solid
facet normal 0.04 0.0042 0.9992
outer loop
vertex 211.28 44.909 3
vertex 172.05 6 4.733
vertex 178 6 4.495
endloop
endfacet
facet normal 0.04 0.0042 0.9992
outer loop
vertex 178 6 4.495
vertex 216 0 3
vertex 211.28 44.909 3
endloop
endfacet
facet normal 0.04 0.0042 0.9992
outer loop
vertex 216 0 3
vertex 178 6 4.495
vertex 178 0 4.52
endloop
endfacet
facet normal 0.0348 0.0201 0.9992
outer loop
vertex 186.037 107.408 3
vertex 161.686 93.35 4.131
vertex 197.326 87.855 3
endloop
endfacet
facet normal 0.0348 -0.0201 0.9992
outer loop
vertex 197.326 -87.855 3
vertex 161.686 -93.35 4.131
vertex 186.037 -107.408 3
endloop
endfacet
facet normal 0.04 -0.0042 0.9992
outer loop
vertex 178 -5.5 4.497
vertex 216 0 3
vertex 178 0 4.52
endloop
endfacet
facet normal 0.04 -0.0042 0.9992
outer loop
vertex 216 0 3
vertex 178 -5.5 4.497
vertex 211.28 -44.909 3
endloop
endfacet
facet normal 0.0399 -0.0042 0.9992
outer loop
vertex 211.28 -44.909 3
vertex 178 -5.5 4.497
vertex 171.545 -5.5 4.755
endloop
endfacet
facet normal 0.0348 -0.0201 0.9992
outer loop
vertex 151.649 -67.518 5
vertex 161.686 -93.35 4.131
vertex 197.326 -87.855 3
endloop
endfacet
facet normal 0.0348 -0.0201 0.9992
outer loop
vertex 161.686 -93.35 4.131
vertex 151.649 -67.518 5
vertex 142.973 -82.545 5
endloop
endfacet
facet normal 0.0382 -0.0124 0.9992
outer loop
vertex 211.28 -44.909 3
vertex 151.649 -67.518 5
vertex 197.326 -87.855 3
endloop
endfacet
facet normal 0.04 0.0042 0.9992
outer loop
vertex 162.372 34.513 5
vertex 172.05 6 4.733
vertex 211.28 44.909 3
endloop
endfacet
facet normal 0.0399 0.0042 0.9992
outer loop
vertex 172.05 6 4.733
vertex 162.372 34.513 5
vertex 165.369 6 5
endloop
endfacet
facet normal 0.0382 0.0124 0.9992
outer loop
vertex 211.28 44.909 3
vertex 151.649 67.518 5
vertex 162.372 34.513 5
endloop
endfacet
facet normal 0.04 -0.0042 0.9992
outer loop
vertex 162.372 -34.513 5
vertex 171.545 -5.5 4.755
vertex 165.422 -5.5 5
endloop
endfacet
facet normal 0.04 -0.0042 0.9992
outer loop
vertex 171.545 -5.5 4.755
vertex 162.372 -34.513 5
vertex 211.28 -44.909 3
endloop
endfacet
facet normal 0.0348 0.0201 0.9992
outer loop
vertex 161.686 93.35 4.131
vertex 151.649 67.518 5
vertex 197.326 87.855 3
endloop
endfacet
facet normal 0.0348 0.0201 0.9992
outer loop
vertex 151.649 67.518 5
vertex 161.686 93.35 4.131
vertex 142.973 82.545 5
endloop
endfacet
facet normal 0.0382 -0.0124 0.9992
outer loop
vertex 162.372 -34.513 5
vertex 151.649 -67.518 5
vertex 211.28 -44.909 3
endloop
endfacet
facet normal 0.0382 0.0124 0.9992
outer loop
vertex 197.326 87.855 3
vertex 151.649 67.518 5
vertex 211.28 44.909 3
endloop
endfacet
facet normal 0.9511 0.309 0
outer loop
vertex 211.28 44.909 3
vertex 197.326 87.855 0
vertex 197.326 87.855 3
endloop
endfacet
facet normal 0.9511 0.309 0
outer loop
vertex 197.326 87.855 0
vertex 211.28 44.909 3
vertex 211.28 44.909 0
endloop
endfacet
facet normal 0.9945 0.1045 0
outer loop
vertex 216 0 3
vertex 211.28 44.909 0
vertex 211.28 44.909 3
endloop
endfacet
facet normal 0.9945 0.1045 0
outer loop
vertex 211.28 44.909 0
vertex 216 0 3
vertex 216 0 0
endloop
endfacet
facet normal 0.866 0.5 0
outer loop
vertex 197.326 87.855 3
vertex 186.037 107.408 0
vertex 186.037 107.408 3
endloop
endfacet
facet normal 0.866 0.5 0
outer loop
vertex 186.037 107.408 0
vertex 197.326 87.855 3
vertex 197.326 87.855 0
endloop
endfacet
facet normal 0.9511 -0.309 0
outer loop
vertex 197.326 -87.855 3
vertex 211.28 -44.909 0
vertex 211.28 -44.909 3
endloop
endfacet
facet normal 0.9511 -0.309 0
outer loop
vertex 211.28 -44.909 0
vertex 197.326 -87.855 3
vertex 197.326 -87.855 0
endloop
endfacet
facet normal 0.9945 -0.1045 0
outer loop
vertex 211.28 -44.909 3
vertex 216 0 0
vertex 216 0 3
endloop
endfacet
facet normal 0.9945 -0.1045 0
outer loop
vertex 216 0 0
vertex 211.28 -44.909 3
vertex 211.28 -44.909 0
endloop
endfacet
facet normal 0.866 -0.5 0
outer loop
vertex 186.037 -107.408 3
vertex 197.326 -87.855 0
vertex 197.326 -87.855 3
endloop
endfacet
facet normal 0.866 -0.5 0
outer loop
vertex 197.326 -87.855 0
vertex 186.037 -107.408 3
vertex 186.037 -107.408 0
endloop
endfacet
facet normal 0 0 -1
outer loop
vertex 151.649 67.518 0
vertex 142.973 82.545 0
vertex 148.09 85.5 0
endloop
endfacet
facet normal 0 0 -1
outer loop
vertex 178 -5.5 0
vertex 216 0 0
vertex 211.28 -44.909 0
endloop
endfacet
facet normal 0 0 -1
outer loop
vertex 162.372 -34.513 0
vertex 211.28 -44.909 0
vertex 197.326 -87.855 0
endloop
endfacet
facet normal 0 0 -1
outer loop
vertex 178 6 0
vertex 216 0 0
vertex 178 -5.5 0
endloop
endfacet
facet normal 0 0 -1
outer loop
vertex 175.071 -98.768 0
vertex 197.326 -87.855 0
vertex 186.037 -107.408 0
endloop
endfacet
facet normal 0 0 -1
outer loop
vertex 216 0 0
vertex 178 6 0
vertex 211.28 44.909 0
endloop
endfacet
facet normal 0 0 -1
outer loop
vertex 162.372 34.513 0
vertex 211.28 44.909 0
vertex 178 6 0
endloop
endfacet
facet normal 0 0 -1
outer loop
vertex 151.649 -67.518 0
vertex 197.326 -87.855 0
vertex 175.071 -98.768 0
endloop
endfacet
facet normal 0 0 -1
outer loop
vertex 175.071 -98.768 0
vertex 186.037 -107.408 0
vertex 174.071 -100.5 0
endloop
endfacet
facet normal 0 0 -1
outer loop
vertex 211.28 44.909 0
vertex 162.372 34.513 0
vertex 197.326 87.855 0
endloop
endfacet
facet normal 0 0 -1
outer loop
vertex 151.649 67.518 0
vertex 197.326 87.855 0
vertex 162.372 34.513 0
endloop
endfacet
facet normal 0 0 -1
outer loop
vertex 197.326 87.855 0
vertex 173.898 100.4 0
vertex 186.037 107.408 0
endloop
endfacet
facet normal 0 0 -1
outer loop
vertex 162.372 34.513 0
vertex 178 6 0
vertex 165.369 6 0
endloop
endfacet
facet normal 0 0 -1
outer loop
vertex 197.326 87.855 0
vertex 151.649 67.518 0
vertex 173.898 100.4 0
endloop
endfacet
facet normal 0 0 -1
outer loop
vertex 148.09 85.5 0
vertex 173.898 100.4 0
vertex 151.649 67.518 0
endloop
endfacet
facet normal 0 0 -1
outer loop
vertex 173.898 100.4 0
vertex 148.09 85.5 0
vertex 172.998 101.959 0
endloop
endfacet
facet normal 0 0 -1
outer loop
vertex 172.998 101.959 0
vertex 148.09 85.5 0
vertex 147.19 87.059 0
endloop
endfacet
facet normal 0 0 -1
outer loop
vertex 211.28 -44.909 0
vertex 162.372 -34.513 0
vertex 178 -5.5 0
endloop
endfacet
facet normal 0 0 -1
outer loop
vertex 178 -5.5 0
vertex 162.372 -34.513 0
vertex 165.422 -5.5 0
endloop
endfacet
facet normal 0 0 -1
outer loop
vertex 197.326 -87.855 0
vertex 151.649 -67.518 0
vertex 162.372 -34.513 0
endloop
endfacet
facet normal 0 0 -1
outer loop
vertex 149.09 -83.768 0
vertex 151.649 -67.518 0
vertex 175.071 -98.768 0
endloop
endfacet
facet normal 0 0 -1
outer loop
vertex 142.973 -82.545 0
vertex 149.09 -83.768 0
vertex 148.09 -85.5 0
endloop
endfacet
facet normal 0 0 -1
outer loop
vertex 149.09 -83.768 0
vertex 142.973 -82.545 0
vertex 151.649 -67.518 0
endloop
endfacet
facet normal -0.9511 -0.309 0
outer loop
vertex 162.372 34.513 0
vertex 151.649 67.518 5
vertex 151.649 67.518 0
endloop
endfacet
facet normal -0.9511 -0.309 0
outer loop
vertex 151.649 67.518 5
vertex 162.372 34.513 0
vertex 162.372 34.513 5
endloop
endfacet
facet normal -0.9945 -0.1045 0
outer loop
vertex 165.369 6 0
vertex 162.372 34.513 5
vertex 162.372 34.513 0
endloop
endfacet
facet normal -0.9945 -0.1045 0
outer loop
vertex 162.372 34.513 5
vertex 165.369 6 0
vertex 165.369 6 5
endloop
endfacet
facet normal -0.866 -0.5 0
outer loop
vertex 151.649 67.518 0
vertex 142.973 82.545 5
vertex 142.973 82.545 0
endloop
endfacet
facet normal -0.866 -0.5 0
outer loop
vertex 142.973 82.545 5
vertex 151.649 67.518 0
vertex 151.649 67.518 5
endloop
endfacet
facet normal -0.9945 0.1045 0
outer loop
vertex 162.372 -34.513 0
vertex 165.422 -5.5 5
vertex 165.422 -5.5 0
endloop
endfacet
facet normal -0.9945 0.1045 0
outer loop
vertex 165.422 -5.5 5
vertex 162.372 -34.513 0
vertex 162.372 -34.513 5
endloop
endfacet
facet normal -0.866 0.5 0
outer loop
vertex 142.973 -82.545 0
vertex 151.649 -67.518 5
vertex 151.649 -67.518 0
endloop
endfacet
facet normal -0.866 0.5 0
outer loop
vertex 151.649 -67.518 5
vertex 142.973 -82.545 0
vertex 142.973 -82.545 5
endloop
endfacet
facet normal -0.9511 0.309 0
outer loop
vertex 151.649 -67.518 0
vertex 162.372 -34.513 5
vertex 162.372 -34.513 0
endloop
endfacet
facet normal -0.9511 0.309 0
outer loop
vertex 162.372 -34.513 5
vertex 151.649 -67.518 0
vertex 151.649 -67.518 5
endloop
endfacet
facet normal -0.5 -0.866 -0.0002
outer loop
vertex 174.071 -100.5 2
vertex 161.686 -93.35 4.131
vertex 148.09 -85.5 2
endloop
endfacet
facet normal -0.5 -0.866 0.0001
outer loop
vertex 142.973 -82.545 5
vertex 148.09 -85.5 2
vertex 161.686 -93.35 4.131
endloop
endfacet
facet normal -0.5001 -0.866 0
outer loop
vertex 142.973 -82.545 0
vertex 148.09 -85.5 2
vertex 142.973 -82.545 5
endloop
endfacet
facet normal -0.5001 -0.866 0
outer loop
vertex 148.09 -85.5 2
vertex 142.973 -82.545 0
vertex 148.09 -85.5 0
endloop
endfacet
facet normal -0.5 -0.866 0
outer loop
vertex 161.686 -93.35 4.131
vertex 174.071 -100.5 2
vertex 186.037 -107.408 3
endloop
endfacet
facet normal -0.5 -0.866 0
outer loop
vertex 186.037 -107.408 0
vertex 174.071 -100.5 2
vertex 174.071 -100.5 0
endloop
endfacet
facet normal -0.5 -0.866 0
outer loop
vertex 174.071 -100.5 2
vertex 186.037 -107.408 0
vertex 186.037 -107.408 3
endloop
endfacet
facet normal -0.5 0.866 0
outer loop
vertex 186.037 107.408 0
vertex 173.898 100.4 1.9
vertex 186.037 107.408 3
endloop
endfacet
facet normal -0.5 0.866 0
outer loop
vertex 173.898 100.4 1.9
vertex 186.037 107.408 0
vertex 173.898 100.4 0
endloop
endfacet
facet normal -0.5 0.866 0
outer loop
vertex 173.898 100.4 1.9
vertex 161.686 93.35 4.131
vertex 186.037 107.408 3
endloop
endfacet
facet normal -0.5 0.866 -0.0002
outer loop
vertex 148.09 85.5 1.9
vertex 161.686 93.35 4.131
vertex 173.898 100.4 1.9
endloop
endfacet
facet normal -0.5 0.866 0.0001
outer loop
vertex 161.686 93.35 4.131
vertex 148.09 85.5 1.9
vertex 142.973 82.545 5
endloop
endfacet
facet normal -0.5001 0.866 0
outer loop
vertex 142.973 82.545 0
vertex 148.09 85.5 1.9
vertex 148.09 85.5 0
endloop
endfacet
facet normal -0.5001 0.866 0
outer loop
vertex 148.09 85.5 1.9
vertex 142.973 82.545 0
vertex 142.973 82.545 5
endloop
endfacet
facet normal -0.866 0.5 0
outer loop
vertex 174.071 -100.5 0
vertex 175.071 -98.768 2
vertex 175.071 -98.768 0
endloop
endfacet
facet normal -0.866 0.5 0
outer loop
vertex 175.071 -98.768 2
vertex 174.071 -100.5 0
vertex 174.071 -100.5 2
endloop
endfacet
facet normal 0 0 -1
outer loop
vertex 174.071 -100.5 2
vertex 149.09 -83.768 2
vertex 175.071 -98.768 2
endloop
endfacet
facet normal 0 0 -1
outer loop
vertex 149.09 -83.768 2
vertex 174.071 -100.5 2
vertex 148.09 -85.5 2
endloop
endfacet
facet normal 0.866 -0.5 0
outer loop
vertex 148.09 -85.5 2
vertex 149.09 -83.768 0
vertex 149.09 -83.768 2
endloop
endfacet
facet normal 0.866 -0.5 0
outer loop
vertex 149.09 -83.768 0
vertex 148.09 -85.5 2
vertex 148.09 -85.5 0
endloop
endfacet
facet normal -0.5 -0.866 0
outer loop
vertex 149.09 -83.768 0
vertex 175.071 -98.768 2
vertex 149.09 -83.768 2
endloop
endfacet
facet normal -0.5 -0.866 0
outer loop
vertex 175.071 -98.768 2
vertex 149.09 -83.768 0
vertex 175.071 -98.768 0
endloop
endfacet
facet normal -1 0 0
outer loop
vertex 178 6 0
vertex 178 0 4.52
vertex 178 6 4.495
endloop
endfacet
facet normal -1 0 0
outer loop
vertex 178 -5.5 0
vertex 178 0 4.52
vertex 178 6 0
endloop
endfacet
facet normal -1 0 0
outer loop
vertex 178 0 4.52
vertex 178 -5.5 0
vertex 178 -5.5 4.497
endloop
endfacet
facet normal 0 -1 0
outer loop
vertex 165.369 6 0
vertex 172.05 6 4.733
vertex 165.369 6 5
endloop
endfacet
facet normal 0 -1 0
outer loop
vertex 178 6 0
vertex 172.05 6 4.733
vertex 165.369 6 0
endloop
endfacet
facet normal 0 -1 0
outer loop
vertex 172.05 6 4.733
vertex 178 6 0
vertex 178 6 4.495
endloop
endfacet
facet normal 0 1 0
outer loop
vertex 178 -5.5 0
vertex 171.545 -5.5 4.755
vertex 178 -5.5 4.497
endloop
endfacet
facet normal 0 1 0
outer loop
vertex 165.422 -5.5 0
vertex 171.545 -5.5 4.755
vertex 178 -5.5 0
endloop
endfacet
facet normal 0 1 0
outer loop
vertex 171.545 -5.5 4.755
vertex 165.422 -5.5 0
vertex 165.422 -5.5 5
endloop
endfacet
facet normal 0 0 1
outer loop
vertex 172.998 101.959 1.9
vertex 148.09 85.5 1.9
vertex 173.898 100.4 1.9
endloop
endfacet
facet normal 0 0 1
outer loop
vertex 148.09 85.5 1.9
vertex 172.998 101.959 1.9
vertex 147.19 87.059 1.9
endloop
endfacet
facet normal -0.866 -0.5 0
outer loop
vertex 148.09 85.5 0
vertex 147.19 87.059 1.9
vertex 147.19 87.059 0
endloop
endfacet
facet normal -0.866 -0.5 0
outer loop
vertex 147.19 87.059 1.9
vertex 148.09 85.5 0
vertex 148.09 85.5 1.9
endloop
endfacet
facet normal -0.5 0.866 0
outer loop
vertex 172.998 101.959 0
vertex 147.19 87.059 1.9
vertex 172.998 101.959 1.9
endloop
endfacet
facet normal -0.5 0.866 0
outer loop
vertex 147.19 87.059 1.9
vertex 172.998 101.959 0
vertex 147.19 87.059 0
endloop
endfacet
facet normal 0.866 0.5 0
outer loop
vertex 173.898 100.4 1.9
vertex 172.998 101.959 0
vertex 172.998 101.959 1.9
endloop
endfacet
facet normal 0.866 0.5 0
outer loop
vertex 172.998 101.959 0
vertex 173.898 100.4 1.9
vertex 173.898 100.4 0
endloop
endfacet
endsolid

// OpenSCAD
// A bird table roof extension in 6 parts
// copyright SJ Hindmarch 2015
// Effort  #2: Getting correct dimensions. Making (most) dims constants.
// To do: Improve design of fixing lug for more stability.
// To do: Check feasibility of manufacture: size of piece; dimension control.

// Real Dimensions
dia_table=356;  //outer diameter of table
lip_width=12;   //width of the lip the cover will rest on
notch_width=11; //width of the notch that appears on the lip. There are 3, 120 deg apart

// Design decisions
roof_width=50;  //width of the roof
inner_ht=5;     //height of roof at inner radius
outer_ht=3;     //height of roof at outer radius
lug_width=2;    //width of the lug piece for connecting
lug_length=30;  //length of connecting lug
lug_ht=2;   //height of connecting lug
lug_fit=0.1;    //tolerance fit of lug

// Derived dimensions
r_inner=(dia_table/2)-lip_width; //radius of inner cylinder
r_outer=r_inner+roof_width;      //radius of outer cylinder
slope_ht=inner_ht-outer_ht;      //height of slope

// The main ring
module ring(){
	difference(){
		union(){
			translate([0,0,outer_ht]){
				cylinder(h=slope_ht,r1=r_outer,r2=r_inner);
			}
			cylinder(h=outer_ht,r=r_outer);
		}
		cylinder(h=inner_ht+outer_ht,r=r_inner);
	}
}

// A big slab for removing half of the object
module slab(){
	translate([-r_outer,-r_outer,0])cube([r_outer,r_outer*2,5]);
}

// A tab for connecting pieces
module lug(tol){
	translate([r_inner+5,-lug_width,0])
		cube([lug_length+tol*2,lug_width*2+tol*2,lug_ht+tol]);
}

// The notch on the existing roof
module notch(){
	translate([0,-notch_width/2,0])
		cube([r_inner+lip_width,notch_width+0.5,inner_ht]);
}

// Main part of the roof. Draw as a cylinder and a cone then remove 300 deg
// to get only a 60 deg sector.
difference(){
	ring();                // The main ring
	// Remove all but a 60 deg sector
	rotate([0,0,60])slab();
	rotate([0,0,-60])slab();
	rotate([0,0,-30])lug(0); // Space for fixing lug
	notch(); // Sfpace for notch
}

rotate([0,0,30])lug(-lug_fit); // A fixing lug
